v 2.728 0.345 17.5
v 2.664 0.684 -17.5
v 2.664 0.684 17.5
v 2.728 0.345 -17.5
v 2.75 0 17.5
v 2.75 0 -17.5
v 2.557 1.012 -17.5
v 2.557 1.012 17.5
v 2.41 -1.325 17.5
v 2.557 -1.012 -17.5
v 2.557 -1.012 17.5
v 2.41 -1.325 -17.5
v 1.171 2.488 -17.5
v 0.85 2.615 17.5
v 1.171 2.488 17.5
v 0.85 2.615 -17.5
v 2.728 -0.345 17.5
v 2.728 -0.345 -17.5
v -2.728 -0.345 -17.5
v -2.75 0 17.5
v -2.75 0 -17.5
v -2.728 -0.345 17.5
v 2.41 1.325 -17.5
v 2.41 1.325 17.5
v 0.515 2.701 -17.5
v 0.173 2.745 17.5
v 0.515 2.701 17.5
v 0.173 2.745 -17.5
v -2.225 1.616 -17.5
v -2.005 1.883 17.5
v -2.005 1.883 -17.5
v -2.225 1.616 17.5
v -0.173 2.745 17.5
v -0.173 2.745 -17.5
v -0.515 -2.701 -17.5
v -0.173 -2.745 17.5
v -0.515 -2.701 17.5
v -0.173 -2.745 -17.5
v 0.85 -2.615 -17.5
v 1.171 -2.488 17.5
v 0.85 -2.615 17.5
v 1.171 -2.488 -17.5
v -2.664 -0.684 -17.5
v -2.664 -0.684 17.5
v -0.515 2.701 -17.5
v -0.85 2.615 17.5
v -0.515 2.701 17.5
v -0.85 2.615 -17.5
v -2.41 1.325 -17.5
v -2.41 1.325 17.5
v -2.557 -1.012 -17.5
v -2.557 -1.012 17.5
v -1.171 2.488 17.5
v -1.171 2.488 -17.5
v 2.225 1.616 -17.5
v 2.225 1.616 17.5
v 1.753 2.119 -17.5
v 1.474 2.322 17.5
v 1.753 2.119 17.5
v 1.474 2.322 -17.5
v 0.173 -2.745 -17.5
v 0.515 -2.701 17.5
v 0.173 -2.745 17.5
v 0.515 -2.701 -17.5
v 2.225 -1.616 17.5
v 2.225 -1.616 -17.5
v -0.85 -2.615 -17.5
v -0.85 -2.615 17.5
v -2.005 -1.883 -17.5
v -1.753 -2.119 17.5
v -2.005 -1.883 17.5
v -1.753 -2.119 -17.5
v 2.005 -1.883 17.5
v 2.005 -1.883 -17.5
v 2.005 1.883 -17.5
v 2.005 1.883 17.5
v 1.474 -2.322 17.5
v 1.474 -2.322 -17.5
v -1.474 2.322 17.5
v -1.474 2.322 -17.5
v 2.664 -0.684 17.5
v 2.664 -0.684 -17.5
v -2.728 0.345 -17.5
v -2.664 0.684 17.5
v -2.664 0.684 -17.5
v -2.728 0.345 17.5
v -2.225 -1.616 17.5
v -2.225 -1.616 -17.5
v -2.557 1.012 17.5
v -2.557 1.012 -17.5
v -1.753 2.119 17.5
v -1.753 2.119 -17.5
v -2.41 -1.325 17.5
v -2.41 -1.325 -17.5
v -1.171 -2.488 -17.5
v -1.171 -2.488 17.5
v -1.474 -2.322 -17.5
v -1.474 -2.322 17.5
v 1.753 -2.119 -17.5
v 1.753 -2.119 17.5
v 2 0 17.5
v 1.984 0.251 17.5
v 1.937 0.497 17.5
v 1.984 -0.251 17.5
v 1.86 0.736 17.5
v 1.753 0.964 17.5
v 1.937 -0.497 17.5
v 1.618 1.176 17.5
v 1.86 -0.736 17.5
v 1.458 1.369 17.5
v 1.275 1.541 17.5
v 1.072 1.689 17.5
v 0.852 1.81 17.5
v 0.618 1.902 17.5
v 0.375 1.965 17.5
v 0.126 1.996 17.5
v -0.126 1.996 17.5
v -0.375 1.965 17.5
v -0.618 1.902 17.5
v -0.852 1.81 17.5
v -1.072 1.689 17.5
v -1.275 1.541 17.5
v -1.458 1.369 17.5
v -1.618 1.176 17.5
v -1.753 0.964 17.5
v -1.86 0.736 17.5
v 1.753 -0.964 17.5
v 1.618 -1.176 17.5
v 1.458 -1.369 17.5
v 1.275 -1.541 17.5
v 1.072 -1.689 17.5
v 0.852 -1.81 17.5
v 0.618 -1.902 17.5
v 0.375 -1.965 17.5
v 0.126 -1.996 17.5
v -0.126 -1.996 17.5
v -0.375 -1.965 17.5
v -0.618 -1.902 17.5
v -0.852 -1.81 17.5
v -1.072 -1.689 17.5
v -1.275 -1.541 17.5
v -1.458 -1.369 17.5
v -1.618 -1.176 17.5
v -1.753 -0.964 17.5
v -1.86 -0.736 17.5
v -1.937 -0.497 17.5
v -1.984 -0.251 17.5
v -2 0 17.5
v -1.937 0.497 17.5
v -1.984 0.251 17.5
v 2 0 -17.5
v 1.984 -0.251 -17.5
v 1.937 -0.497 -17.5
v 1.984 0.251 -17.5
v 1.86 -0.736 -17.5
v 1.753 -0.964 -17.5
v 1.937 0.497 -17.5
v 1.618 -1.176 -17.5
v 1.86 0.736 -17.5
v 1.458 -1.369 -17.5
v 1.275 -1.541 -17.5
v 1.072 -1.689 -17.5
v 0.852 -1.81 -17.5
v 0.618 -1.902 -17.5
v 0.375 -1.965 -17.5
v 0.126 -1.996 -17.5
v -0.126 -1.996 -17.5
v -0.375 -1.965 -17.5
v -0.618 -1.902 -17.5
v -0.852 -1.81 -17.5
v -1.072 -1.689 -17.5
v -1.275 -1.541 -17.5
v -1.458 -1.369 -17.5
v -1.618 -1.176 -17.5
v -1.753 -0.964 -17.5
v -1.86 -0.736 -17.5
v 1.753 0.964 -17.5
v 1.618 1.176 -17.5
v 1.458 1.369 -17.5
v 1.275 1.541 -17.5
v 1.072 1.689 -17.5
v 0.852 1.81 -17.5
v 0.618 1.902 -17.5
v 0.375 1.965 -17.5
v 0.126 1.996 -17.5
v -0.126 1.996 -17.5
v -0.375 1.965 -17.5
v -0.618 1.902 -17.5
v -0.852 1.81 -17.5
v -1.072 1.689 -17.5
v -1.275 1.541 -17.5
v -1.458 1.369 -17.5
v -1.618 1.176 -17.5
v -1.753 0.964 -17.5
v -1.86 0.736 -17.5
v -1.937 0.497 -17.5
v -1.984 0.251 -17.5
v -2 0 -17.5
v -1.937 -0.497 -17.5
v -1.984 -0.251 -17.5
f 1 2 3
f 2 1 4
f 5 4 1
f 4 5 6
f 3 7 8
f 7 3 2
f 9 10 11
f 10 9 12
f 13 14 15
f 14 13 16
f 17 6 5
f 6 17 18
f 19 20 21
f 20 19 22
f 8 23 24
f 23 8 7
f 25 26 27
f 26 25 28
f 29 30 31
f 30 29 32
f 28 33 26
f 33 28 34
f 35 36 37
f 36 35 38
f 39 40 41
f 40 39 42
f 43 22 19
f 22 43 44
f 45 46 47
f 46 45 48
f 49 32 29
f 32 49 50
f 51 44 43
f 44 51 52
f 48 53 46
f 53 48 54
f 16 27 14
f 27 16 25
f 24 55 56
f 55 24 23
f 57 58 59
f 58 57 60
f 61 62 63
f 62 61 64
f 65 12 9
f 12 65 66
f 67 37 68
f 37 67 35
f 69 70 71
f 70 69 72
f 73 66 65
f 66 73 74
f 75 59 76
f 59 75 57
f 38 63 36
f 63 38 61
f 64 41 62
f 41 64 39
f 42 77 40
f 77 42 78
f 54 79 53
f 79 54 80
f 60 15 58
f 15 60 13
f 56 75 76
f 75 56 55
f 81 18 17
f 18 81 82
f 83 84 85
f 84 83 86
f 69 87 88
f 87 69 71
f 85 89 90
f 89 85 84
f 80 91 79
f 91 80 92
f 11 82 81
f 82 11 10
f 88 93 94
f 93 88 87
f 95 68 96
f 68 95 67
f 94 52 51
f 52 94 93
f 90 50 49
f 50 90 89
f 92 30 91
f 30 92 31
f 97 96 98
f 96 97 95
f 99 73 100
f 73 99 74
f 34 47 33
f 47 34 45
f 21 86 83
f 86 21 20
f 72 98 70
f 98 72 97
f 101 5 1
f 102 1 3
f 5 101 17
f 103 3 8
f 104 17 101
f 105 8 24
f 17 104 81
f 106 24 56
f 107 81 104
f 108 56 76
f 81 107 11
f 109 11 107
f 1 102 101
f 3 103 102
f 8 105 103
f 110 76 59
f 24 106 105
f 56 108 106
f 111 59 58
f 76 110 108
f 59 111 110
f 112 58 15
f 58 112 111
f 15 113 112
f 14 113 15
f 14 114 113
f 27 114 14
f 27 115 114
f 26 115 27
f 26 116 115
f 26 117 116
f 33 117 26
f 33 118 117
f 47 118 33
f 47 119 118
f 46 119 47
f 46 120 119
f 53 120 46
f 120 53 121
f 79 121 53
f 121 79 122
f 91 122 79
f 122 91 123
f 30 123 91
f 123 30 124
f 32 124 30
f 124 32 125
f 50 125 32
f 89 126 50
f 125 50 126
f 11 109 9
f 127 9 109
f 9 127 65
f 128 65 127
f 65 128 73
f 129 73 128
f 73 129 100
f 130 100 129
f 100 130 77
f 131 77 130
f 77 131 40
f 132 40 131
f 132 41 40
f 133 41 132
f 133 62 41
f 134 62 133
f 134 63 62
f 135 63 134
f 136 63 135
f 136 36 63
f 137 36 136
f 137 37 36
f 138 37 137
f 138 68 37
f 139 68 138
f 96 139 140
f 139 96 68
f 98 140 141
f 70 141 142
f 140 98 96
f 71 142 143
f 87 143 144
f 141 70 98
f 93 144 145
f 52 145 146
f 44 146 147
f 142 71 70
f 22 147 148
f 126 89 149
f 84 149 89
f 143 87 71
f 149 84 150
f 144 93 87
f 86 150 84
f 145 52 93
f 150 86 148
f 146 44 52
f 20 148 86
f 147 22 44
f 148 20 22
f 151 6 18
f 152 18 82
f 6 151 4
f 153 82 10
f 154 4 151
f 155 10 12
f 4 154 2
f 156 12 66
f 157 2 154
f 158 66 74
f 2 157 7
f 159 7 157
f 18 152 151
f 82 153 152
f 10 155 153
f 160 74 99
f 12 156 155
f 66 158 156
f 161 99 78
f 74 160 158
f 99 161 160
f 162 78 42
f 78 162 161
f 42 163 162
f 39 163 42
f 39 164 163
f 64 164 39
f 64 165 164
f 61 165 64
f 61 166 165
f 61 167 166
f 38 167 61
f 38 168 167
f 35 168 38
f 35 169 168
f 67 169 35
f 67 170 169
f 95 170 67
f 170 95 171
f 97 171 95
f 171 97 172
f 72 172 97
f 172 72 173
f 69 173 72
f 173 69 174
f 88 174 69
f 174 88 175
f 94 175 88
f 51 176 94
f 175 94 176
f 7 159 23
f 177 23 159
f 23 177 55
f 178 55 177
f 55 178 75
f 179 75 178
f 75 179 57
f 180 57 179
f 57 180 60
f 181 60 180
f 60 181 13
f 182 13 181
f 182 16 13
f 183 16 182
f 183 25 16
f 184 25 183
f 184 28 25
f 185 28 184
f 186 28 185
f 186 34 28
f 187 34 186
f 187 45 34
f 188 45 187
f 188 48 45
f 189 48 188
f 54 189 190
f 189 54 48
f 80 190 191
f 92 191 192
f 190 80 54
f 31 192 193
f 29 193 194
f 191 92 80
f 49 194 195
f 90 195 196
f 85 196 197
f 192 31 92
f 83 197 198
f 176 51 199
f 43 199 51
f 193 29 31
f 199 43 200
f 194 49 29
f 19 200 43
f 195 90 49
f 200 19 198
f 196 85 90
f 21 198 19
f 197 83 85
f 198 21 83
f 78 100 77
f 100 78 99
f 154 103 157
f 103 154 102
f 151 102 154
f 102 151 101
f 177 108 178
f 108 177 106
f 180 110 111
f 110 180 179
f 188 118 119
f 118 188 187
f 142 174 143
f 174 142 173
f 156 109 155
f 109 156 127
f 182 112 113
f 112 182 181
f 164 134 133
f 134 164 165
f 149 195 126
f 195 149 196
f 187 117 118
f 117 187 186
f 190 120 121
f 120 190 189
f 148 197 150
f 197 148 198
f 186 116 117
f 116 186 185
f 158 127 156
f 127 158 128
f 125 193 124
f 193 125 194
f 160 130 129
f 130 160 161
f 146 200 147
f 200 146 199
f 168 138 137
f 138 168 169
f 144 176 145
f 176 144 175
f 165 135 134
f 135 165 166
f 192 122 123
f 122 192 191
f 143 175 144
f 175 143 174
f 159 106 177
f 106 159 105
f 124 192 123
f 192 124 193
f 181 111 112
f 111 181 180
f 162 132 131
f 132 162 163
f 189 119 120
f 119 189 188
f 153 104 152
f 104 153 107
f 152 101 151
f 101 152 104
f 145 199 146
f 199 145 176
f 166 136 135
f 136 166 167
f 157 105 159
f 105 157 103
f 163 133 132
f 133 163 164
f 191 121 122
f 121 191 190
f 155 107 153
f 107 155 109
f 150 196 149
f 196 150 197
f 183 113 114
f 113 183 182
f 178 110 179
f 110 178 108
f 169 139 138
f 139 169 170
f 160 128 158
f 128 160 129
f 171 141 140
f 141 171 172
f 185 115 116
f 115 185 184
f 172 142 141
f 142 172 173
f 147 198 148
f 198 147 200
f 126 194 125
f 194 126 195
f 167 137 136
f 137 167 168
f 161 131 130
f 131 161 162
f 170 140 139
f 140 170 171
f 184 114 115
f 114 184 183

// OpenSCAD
$fn = 50;


difference() {
	union() {
		translate(v = [0, 0, -17.5000000000]) {
			cylinder(h = 35, r = 2.7500000000);
		}
	}
	union() {
		translate(v = [0, 0, -100.0000000000]) {
			cylinder(h = 200, r = 2.0000000000);
		}
	}
}
